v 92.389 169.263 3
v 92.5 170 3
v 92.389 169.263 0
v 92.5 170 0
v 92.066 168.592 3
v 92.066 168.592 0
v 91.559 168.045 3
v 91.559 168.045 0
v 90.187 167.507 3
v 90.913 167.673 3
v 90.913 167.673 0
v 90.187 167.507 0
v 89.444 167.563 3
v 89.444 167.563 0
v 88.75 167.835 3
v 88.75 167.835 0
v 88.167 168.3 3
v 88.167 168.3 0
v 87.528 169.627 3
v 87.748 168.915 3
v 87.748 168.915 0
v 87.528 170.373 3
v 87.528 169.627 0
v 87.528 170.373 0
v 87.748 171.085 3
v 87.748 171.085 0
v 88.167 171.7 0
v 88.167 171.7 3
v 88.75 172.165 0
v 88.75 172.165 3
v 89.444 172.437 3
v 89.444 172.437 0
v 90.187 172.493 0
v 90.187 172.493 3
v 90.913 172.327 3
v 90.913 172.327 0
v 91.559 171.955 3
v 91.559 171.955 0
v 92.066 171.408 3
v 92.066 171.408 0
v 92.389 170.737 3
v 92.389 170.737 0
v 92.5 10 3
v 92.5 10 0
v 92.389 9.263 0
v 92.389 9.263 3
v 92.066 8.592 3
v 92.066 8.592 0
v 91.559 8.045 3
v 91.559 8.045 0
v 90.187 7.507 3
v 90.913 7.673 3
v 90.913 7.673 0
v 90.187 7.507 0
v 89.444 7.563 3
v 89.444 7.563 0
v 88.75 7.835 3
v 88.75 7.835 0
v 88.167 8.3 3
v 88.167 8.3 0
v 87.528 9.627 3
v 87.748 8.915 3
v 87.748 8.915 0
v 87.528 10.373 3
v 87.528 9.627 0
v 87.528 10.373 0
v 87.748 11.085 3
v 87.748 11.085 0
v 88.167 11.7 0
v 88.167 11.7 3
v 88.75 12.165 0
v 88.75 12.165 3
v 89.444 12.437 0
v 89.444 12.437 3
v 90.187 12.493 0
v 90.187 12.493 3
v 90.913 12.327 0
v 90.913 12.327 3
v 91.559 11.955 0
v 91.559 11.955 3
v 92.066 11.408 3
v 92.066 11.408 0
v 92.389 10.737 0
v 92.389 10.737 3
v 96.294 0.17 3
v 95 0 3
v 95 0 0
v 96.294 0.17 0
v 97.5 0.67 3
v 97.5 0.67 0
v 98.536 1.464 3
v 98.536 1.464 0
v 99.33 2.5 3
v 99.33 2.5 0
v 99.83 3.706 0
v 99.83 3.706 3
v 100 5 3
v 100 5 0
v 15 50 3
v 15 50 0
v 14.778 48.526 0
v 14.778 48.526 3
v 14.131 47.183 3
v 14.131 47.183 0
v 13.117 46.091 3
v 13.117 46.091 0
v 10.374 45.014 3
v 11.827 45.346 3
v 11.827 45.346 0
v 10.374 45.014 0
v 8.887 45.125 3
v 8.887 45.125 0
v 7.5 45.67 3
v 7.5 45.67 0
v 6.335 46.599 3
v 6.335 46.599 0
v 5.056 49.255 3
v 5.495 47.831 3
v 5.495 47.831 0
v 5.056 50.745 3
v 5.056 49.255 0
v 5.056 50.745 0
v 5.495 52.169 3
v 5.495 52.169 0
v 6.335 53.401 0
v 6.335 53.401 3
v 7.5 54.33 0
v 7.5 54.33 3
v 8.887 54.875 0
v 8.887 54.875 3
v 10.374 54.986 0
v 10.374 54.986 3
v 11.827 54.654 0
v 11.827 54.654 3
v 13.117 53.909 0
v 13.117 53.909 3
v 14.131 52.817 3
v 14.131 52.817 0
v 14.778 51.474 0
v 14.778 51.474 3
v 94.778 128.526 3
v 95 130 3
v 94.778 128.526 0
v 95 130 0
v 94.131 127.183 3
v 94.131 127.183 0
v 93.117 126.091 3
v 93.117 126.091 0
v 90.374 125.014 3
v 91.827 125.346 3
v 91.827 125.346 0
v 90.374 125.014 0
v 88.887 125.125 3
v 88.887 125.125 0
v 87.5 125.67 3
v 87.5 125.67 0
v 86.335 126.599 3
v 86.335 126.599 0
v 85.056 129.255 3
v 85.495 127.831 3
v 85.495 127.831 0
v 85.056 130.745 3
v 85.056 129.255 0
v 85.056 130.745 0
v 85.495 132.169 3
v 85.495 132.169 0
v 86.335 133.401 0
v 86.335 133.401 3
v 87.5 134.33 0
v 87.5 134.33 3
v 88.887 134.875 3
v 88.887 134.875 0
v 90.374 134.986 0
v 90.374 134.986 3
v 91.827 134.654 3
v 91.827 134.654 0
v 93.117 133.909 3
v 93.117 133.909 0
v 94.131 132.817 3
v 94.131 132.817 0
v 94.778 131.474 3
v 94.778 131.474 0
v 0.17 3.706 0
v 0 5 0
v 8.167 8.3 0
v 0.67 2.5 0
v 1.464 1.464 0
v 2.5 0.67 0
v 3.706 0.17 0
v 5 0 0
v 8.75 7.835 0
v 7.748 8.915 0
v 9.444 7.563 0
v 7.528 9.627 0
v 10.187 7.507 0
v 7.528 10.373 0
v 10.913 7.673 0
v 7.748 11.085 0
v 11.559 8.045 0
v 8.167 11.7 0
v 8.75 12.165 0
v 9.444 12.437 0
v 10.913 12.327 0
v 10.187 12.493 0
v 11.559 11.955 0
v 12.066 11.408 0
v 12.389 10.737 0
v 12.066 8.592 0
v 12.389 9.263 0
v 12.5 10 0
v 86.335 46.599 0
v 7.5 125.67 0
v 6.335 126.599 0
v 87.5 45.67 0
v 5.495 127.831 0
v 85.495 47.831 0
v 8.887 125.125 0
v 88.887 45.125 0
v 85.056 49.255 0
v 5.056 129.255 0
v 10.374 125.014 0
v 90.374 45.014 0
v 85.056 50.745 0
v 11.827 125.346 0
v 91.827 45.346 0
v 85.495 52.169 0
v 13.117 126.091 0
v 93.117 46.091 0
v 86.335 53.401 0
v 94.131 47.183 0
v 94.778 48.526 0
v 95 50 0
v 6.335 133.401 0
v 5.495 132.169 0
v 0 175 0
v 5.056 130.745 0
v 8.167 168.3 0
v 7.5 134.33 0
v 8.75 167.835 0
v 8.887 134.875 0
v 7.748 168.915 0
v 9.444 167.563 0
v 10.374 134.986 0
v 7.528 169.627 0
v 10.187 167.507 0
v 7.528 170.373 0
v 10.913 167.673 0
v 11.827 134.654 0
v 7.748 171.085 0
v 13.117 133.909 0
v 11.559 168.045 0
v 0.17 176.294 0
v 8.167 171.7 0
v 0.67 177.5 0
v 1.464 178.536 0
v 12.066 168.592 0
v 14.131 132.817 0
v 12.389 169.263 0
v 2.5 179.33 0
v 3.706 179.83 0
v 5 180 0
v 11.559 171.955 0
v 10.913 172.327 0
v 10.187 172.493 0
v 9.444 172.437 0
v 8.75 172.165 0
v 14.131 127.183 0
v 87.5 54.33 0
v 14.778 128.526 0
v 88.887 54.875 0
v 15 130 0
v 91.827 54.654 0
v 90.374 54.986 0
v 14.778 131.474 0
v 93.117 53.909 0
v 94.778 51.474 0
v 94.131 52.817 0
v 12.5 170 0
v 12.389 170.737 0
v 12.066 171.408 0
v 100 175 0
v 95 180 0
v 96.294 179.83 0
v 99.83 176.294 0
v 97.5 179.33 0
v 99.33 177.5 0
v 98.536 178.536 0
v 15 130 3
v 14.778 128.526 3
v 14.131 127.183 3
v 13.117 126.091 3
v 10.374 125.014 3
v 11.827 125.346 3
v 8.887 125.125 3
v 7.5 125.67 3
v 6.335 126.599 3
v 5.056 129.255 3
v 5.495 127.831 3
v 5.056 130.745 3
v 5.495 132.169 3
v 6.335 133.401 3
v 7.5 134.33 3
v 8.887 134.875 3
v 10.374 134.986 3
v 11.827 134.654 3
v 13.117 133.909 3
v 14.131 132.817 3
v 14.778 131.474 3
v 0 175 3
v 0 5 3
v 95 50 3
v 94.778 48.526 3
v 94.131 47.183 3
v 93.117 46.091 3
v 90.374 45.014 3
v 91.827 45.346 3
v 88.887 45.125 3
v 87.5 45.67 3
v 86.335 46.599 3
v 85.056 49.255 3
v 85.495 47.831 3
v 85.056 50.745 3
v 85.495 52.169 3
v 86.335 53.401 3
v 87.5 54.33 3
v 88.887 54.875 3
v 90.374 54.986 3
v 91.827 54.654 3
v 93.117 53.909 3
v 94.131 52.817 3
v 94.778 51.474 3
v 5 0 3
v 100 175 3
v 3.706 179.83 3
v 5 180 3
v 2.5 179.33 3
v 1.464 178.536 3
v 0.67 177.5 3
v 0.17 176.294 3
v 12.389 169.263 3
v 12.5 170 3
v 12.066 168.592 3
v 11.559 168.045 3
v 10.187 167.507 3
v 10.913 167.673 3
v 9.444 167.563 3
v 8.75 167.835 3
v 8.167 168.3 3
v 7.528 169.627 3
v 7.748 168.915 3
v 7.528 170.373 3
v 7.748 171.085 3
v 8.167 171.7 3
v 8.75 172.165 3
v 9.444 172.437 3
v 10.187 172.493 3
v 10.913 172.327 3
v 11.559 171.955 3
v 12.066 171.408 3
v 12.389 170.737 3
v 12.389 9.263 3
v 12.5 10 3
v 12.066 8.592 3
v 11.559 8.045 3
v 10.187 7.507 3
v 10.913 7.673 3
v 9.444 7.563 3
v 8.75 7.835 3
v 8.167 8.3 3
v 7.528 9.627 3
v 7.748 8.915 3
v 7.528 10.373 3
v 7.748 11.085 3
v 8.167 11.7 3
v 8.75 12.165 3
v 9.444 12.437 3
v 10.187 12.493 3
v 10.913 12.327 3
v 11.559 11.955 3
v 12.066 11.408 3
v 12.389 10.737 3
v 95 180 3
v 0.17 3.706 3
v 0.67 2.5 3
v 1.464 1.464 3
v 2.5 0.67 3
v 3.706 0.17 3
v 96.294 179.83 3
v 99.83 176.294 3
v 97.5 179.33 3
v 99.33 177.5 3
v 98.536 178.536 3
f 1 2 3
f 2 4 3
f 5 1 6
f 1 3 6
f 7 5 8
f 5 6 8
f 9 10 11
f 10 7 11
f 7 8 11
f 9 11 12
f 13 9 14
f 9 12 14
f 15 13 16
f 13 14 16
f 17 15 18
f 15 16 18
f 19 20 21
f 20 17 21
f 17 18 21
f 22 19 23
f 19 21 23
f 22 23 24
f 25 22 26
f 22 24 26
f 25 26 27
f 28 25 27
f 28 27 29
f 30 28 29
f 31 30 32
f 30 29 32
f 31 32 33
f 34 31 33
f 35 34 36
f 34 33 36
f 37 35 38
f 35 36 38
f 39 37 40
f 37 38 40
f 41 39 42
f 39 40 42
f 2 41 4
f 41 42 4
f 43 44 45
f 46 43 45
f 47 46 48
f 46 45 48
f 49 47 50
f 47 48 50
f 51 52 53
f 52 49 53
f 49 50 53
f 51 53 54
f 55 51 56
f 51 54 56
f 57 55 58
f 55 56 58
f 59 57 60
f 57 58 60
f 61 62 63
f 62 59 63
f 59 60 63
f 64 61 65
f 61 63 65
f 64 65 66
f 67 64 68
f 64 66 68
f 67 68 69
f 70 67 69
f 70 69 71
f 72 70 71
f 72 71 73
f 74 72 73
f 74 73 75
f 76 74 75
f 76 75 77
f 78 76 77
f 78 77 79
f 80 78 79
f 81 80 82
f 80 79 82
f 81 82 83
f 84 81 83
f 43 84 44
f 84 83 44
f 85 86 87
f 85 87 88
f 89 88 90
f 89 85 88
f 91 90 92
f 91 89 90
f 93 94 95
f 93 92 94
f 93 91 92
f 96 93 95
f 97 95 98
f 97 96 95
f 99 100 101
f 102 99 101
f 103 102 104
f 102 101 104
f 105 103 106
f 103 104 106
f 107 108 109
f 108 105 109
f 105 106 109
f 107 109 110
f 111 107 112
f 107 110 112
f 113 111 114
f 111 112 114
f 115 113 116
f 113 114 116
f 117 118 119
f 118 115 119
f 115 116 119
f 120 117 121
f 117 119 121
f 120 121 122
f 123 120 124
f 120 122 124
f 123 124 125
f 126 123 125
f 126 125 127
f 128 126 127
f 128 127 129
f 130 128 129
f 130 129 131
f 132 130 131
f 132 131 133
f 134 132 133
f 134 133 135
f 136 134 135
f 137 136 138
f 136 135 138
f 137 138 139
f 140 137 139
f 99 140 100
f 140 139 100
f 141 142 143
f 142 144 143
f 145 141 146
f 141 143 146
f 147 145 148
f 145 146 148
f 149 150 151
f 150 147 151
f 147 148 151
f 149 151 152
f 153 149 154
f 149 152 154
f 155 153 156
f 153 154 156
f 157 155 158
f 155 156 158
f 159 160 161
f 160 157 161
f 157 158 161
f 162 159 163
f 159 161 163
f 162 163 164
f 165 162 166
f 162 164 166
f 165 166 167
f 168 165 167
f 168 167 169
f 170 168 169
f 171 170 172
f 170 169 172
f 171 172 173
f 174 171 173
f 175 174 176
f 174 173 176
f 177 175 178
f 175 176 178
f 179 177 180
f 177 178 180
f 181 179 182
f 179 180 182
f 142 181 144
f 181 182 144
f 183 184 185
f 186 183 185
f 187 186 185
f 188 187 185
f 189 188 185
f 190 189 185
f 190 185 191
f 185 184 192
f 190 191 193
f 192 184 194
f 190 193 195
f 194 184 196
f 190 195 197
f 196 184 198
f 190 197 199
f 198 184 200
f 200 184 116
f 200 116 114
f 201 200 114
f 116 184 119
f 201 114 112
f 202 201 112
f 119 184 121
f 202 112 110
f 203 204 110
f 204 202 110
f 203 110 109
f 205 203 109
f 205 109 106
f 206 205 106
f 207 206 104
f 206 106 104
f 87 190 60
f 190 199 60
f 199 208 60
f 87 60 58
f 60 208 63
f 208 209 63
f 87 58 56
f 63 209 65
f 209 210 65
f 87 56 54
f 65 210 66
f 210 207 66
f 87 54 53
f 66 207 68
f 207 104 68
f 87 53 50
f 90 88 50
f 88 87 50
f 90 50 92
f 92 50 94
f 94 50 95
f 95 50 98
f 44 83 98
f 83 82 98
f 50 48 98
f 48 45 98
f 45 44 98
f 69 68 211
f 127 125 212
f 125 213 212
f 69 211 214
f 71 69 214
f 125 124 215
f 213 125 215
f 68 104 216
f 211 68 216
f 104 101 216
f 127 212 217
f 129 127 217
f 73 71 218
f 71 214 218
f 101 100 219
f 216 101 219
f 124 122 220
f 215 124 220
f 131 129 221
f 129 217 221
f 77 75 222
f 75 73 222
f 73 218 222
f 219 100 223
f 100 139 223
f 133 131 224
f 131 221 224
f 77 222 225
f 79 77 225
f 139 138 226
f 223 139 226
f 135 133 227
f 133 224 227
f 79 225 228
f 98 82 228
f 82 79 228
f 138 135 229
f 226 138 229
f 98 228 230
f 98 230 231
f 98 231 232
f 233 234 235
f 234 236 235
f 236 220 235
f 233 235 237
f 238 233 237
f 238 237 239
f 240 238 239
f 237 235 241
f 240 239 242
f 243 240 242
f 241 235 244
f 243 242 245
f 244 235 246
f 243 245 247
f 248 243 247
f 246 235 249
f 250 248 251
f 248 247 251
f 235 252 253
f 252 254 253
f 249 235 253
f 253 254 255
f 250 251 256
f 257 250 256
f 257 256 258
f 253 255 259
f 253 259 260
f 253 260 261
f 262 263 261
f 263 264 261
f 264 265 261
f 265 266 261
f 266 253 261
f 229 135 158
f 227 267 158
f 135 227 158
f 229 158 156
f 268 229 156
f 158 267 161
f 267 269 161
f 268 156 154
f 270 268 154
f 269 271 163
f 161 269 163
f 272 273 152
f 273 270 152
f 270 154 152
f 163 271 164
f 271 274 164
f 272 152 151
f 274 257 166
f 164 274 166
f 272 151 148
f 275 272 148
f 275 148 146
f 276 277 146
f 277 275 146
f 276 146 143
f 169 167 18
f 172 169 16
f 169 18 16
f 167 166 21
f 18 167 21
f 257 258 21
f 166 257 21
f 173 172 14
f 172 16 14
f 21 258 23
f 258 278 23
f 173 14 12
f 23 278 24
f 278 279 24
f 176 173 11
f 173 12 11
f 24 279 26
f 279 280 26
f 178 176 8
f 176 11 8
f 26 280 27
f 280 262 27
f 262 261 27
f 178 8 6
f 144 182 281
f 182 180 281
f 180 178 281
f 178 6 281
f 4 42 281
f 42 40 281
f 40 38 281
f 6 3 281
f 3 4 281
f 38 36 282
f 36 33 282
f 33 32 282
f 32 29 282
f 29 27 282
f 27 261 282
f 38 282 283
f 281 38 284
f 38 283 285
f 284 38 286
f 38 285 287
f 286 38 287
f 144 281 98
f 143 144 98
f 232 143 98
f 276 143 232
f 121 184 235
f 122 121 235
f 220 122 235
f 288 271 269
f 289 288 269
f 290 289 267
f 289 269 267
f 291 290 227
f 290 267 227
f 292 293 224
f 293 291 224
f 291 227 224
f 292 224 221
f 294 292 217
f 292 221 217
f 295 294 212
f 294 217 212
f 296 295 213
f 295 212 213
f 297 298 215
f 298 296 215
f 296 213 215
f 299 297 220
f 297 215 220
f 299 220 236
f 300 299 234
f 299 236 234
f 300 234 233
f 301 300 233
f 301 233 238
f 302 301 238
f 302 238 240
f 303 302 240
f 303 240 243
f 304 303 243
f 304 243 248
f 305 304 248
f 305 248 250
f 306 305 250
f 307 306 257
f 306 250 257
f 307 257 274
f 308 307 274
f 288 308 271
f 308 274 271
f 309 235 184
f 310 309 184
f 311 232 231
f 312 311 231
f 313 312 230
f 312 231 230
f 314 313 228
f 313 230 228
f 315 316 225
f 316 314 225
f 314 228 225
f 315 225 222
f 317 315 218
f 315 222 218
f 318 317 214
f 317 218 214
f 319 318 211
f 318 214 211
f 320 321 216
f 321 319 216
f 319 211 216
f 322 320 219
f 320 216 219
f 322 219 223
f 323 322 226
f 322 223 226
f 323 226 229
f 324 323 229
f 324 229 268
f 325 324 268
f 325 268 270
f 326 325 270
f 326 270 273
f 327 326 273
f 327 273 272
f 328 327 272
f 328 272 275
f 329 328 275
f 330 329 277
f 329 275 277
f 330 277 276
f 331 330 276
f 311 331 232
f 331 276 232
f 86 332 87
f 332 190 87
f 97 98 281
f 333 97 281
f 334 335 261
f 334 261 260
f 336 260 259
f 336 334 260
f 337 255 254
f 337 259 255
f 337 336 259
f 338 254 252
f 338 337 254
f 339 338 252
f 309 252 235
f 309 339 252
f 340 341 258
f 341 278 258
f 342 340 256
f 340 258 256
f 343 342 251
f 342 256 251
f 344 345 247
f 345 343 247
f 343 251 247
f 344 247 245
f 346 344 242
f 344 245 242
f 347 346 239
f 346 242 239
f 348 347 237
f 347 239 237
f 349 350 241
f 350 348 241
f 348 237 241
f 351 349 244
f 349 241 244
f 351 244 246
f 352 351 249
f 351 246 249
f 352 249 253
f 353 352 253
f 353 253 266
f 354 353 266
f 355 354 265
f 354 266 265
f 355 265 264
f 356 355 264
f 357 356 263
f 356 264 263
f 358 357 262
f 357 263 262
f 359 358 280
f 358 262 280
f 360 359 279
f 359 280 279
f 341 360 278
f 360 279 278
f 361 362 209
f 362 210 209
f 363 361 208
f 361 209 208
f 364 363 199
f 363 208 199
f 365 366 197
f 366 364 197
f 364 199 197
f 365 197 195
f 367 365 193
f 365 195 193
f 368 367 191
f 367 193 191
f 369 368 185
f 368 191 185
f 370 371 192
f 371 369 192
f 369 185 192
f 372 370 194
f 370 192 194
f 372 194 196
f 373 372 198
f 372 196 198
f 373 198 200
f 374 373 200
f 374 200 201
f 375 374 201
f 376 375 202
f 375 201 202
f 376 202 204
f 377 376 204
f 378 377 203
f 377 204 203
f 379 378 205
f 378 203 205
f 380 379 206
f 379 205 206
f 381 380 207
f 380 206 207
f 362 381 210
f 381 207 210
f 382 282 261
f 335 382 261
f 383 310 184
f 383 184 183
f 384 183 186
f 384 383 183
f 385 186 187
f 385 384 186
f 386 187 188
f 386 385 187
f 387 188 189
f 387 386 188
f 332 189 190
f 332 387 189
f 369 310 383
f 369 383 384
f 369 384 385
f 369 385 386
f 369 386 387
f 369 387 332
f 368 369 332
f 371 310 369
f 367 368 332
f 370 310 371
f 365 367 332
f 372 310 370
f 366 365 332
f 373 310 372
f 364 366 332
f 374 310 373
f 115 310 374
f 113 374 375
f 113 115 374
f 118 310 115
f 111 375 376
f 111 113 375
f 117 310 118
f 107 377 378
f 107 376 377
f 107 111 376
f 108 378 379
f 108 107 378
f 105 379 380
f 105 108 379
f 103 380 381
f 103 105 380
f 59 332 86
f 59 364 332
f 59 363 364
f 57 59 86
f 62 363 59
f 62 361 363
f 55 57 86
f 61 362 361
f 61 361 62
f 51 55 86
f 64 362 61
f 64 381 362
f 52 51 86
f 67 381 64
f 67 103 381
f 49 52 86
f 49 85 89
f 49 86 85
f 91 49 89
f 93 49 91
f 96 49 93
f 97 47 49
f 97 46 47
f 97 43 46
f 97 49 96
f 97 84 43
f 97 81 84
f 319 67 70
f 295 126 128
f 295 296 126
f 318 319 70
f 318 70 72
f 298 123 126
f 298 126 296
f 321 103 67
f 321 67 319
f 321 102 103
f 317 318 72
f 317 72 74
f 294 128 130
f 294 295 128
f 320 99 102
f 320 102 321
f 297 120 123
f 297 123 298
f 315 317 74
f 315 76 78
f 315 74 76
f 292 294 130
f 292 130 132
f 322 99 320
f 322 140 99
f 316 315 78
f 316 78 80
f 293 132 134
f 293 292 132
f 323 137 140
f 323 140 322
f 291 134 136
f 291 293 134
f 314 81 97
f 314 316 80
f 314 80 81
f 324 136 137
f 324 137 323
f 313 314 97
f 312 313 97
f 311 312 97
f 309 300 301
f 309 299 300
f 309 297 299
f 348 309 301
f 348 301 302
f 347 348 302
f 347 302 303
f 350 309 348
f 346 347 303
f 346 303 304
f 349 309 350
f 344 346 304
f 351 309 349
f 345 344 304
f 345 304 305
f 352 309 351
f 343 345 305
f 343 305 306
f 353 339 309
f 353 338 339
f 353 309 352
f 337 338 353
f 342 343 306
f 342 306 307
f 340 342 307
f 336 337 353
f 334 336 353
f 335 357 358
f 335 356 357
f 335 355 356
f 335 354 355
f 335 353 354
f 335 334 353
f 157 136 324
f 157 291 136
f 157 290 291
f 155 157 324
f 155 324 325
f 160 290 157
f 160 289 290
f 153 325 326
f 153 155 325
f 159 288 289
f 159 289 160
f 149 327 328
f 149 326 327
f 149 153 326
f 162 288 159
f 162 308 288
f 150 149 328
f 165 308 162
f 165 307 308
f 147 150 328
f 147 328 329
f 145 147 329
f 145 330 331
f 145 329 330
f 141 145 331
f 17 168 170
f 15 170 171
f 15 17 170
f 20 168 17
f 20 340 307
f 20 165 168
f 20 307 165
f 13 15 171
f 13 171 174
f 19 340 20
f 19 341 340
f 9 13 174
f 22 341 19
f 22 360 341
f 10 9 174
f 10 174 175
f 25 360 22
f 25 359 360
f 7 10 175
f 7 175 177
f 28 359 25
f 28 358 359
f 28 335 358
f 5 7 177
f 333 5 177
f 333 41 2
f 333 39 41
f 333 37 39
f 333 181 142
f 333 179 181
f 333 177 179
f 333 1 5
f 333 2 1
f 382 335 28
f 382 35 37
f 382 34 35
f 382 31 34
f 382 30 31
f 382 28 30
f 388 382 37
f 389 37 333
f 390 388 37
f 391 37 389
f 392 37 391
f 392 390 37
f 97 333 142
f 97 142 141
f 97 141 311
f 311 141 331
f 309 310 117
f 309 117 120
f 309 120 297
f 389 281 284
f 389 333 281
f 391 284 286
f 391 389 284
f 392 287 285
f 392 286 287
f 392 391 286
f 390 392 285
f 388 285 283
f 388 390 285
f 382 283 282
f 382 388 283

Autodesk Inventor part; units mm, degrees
ref_plane "YZ Plane" through (0, 0, 0) normal (1, 0, 0) x (0, 1, 0)
ref_plane "XZ Plane" through (0, 0, 0) normal (0, 1, 0) x (-1, 0, 0)
ref_plane "XY Plane" through (0, 0, 0) normal (0, 0, 1) x (1, 0, 0)
sketch "スケッチ1" plane through (0, 0, 0) normal (0, 0, 1) x (1, 0, 0)
  line L0 (0, 0) -> (100, 0)
  line L1 (100, 0) -> (100, 180)
  line L2 (100, 180) -> (0, 180)
  line L3 (0, 180) -> (0, 0)
  line L4 (0, 10) -> (100, 10) construction
  circle A0 centre (10, 10) radius 2.5
  circle A1 centre (90, 10) radius 2.5
  circle A2 centre (10, 130) radius 5
  circle A3 centre (10, 50) radius 5
  circle A4 centre (90, 130) radius 5
  circle A5 centre (90, 50) radius 5
  line L5 (10, 130) -> (10, 50) construction
  line L6 (10, 50) -> (90, 50) construction
  line L7 (90, 50) -> (90, 130) construction
  line L8 (90, 130) -> (10, 130) construction
  line L9 (0, 90) -> (100, 90) construction
  circle A6 centre (10, 170) radius 2.5
  circle A7 centre (90, 170) radius 2.5
  dimension "d0" = 5
  dimension "d1" = 10
  dimension "d2" = 10
  dimension "d3" = 10
  dimension "d4" = 100
  dimension "d5" = 180
  dimension "d12" = 10
  dimension "d13" = 10
  dimension "d15" = 10
  dimension "d21" = 80
  dimension "d23" = 50
extrude "押し出し1" add sketch "スケッチ1" along normal blind 3
fillet "フィレット1" radius 5 4 edges at (100, 180, 1.5) (0, 180, 1.5) (100, 0, 1.5) (0, 0, 1.5)
properties part number "LRFマウント"
